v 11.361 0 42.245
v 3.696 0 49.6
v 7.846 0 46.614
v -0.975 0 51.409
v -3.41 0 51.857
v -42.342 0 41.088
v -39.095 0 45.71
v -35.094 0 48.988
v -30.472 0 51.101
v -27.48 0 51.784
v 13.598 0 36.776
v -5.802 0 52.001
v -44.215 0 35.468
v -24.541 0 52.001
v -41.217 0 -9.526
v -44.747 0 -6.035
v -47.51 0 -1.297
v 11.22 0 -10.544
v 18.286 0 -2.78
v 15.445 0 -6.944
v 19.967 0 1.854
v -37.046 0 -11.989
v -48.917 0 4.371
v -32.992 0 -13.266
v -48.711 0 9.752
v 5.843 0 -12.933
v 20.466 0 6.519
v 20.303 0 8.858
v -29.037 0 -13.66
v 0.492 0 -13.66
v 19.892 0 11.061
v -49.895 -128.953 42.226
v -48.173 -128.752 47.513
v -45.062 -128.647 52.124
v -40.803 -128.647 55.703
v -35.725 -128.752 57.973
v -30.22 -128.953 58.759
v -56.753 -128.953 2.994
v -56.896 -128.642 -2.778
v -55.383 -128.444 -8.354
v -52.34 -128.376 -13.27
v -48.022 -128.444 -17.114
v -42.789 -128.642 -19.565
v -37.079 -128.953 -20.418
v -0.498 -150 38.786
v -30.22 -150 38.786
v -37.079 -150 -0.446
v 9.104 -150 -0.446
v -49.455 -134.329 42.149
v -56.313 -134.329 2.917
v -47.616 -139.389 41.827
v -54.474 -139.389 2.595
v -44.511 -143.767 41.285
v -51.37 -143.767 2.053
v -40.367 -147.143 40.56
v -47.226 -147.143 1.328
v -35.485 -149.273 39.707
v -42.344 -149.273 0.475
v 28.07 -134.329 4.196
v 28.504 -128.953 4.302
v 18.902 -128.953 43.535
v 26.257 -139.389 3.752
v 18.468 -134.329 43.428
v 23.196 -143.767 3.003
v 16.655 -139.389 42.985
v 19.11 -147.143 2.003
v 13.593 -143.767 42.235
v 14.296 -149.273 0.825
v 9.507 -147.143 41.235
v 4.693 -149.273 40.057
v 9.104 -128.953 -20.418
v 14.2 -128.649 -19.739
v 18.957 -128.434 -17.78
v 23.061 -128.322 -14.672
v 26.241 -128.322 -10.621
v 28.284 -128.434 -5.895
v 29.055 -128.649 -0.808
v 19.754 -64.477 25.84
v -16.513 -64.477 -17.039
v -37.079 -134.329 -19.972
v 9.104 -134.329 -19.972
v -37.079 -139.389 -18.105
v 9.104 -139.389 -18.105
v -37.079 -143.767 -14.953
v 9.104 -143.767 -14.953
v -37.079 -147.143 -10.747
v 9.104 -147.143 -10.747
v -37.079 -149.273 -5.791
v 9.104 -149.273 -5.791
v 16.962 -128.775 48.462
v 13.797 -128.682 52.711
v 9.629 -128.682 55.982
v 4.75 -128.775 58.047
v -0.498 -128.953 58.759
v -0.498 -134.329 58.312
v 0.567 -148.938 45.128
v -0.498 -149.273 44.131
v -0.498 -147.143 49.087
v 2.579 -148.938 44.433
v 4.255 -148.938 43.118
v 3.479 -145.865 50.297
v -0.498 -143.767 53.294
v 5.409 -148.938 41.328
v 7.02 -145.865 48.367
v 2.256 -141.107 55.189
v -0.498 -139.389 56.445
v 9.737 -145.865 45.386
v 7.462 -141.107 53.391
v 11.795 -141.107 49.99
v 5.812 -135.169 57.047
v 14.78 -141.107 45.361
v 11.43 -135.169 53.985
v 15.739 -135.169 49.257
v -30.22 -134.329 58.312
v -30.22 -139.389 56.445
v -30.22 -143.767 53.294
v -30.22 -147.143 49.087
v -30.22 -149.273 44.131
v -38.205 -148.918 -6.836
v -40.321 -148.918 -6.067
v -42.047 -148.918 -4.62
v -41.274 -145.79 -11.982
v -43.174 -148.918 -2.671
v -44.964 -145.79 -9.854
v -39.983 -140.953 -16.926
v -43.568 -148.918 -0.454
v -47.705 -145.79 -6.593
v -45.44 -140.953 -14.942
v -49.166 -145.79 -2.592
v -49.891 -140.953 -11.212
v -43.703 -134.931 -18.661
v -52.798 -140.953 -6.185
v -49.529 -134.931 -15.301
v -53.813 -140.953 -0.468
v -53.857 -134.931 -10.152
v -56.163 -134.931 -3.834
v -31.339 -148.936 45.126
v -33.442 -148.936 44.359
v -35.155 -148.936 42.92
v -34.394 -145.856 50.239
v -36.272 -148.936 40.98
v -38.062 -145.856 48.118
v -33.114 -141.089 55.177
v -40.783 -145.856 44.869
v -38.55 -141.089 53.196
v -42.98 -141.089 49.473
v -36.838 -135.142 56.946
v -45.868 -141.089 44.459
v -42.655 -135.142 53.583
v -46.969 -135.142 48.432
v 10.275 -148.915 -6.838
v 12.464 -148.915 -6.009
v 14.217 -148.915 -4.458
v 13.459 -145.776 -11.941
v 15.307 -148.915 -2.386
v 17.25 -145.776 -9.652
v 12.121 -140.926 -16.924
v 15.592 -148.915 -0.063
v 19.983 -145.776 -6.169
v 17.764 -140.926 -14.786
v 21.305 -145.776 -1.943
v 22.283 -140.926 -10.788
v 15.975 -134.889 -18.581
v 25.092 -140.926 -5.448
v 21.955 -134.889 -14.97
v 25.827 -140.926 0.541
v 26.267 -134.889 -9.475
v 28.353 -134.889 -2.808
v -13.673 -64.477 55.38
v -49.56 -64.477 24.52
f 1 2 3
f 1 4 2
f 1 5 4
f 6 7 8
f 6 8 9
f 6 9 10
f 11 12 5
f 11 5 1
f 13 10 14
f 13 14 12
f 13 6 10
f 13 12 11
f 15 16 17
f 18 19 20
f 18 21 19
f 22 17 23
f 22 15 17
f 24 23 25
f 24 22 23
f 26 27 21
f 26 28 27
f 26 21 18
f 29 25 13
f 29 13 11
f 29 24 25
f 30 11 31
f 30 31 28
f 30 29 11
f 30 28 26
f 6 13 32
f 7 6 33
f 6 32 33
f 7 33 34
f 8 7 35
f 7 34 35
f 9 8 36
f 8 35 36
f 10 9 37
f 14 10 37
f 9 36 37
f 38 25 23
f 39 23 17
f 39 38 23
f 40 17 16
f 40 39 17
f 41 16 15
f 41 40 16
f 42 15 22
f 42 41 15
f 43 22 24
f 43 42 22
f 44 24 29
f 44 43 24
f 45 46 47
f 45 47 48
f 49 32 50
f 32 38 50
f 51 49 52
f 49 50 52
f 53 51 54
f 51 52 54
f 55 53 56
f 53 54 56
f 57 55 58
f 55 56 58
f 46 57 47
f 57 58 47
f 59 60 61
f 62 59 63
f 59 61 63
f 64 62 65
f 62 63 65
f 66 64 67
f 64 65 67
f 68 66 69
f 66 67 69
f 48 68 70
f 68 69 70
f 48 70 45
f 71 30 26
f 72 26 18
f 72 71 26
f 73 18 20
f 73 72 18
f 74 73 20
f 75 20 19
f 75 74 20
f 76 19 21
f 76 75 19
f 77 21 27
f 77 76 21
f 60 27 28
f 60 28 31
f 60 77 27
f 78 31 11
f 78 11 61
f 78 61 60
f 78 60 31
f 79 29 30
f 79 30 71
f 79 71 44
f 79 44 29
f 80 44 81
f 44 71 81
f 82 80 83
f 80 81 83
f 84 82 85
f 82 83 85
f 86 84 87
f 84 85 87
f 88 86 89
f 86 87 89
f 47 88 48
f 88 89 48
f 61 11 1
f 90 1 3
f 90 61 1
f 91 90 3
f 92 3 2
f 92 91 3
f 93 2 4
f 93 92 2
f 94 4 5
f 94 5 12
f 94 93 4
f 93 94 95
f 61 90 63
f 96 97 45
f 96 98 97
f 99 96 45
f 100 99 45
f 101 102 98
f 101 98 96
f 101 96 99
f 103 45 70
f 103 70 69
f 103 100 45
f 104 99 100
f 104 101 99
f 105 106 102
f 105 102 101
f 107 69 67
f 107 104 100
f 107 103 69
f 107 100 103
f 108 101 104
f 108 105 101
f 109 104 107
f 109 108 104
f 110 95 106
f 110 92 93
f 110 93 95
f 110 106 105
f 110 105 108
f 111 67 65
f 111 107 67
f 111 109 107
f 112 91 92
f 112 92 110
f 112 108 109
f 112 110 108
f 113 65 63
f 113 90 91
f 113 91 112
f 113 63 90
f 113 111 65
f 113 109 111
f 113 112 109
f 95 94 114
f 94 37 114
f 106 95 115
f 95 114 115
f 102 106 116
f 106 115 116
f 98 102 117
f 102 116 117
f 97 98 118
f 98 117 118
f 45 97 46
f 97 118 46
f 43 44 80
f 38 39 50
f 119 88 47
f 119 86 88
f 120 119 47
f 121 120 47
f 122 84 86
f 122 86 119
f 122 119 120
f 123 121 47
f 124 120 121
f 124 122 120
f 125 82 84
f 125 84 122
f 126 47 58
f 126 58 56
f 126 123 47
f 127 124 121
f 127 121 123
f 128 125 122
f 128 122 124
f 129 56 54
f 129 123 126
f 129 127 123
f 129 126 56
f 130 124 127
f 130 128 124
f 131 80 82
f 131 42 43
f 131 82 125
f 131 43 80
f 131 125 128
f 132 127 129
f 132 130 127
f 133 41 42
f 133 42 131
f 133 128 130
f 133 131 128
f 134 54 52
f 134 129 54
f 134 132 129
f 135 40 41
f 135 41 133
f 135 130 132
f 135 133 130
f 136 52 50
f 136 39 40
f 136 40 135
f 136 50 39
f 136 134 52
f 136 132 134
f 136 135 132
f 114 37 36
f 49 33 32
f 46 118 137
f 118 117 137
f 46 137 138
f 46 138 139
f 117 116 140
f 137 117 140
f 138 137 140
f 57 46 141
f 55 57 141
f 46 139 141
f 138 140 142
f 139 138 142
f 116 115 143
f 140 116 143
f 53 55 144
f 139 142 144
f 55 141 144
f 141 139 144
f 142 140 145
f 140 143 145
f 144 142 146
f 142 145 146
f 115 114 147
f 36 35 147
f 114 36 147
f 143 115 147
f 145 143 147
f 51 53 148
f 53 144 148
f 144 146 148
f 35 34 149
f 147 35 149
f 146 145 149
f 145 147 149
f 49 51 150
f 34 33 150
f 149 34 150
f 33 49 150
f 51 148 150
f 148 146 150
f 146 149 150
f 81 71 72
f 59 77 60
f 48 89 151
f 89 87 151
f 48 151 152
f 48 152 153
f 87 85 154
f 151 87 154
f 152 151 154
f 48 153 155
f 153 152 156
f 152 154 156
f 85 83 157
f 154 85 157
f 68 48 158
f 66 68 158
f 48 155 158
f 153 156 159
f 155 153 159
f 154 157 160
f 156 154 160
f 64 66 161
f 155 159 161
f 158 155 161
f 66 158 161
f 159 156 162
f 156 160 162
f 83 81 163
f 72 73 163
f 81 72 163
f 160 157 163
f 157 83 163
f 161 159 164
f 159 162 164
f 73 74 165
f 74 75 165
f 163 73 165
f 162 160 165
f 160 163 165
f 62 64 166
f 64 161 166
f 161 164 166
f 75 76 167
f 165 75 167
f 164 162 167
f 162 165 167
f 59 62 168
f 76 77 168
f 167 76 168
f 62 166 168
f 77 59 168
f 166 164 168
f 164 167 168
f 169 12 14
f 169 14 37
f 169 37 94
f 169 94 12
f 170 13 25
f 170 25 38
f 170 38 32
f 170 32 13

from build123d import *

# Parameters (mm, degrees)
F1_DEPTH = 150
F1_TAPER = -3
F2_R     = 20


with BuildPart() as f1:
    # F0 (on Front) → F1 (new body)
    with BuildSketch(Plane.XZ):
        Polygon((-41.3251072168, 52.0007610321), (-52.8043024242, -13.6602437124), (25.9429831058, -13.6602437124), (9.8721086979, 52.0007610321), align=None)
    extrude(amount=F1_DEPTH, taper=F1_TAPER)

    # F2
    f2_edges = [f1.edges().sort_by_distance(p)[0] for p in [
        (-44.628141, -75, 55.931344),
        (12.95668, -75, 55.931344),
        (30.951616, -75, -17.590827),
        (-57.481665, -75, -17.590827),
        (-13.09939, -150, -21.521411),
        (-15.944961, -150, 59.861928),
        (-55.045101, -150, 19.170259),
        (26.00075, -150, 19.170259),
    ]]
    fillet(f2_edges, radius=F2_R)


solid = f1.part
